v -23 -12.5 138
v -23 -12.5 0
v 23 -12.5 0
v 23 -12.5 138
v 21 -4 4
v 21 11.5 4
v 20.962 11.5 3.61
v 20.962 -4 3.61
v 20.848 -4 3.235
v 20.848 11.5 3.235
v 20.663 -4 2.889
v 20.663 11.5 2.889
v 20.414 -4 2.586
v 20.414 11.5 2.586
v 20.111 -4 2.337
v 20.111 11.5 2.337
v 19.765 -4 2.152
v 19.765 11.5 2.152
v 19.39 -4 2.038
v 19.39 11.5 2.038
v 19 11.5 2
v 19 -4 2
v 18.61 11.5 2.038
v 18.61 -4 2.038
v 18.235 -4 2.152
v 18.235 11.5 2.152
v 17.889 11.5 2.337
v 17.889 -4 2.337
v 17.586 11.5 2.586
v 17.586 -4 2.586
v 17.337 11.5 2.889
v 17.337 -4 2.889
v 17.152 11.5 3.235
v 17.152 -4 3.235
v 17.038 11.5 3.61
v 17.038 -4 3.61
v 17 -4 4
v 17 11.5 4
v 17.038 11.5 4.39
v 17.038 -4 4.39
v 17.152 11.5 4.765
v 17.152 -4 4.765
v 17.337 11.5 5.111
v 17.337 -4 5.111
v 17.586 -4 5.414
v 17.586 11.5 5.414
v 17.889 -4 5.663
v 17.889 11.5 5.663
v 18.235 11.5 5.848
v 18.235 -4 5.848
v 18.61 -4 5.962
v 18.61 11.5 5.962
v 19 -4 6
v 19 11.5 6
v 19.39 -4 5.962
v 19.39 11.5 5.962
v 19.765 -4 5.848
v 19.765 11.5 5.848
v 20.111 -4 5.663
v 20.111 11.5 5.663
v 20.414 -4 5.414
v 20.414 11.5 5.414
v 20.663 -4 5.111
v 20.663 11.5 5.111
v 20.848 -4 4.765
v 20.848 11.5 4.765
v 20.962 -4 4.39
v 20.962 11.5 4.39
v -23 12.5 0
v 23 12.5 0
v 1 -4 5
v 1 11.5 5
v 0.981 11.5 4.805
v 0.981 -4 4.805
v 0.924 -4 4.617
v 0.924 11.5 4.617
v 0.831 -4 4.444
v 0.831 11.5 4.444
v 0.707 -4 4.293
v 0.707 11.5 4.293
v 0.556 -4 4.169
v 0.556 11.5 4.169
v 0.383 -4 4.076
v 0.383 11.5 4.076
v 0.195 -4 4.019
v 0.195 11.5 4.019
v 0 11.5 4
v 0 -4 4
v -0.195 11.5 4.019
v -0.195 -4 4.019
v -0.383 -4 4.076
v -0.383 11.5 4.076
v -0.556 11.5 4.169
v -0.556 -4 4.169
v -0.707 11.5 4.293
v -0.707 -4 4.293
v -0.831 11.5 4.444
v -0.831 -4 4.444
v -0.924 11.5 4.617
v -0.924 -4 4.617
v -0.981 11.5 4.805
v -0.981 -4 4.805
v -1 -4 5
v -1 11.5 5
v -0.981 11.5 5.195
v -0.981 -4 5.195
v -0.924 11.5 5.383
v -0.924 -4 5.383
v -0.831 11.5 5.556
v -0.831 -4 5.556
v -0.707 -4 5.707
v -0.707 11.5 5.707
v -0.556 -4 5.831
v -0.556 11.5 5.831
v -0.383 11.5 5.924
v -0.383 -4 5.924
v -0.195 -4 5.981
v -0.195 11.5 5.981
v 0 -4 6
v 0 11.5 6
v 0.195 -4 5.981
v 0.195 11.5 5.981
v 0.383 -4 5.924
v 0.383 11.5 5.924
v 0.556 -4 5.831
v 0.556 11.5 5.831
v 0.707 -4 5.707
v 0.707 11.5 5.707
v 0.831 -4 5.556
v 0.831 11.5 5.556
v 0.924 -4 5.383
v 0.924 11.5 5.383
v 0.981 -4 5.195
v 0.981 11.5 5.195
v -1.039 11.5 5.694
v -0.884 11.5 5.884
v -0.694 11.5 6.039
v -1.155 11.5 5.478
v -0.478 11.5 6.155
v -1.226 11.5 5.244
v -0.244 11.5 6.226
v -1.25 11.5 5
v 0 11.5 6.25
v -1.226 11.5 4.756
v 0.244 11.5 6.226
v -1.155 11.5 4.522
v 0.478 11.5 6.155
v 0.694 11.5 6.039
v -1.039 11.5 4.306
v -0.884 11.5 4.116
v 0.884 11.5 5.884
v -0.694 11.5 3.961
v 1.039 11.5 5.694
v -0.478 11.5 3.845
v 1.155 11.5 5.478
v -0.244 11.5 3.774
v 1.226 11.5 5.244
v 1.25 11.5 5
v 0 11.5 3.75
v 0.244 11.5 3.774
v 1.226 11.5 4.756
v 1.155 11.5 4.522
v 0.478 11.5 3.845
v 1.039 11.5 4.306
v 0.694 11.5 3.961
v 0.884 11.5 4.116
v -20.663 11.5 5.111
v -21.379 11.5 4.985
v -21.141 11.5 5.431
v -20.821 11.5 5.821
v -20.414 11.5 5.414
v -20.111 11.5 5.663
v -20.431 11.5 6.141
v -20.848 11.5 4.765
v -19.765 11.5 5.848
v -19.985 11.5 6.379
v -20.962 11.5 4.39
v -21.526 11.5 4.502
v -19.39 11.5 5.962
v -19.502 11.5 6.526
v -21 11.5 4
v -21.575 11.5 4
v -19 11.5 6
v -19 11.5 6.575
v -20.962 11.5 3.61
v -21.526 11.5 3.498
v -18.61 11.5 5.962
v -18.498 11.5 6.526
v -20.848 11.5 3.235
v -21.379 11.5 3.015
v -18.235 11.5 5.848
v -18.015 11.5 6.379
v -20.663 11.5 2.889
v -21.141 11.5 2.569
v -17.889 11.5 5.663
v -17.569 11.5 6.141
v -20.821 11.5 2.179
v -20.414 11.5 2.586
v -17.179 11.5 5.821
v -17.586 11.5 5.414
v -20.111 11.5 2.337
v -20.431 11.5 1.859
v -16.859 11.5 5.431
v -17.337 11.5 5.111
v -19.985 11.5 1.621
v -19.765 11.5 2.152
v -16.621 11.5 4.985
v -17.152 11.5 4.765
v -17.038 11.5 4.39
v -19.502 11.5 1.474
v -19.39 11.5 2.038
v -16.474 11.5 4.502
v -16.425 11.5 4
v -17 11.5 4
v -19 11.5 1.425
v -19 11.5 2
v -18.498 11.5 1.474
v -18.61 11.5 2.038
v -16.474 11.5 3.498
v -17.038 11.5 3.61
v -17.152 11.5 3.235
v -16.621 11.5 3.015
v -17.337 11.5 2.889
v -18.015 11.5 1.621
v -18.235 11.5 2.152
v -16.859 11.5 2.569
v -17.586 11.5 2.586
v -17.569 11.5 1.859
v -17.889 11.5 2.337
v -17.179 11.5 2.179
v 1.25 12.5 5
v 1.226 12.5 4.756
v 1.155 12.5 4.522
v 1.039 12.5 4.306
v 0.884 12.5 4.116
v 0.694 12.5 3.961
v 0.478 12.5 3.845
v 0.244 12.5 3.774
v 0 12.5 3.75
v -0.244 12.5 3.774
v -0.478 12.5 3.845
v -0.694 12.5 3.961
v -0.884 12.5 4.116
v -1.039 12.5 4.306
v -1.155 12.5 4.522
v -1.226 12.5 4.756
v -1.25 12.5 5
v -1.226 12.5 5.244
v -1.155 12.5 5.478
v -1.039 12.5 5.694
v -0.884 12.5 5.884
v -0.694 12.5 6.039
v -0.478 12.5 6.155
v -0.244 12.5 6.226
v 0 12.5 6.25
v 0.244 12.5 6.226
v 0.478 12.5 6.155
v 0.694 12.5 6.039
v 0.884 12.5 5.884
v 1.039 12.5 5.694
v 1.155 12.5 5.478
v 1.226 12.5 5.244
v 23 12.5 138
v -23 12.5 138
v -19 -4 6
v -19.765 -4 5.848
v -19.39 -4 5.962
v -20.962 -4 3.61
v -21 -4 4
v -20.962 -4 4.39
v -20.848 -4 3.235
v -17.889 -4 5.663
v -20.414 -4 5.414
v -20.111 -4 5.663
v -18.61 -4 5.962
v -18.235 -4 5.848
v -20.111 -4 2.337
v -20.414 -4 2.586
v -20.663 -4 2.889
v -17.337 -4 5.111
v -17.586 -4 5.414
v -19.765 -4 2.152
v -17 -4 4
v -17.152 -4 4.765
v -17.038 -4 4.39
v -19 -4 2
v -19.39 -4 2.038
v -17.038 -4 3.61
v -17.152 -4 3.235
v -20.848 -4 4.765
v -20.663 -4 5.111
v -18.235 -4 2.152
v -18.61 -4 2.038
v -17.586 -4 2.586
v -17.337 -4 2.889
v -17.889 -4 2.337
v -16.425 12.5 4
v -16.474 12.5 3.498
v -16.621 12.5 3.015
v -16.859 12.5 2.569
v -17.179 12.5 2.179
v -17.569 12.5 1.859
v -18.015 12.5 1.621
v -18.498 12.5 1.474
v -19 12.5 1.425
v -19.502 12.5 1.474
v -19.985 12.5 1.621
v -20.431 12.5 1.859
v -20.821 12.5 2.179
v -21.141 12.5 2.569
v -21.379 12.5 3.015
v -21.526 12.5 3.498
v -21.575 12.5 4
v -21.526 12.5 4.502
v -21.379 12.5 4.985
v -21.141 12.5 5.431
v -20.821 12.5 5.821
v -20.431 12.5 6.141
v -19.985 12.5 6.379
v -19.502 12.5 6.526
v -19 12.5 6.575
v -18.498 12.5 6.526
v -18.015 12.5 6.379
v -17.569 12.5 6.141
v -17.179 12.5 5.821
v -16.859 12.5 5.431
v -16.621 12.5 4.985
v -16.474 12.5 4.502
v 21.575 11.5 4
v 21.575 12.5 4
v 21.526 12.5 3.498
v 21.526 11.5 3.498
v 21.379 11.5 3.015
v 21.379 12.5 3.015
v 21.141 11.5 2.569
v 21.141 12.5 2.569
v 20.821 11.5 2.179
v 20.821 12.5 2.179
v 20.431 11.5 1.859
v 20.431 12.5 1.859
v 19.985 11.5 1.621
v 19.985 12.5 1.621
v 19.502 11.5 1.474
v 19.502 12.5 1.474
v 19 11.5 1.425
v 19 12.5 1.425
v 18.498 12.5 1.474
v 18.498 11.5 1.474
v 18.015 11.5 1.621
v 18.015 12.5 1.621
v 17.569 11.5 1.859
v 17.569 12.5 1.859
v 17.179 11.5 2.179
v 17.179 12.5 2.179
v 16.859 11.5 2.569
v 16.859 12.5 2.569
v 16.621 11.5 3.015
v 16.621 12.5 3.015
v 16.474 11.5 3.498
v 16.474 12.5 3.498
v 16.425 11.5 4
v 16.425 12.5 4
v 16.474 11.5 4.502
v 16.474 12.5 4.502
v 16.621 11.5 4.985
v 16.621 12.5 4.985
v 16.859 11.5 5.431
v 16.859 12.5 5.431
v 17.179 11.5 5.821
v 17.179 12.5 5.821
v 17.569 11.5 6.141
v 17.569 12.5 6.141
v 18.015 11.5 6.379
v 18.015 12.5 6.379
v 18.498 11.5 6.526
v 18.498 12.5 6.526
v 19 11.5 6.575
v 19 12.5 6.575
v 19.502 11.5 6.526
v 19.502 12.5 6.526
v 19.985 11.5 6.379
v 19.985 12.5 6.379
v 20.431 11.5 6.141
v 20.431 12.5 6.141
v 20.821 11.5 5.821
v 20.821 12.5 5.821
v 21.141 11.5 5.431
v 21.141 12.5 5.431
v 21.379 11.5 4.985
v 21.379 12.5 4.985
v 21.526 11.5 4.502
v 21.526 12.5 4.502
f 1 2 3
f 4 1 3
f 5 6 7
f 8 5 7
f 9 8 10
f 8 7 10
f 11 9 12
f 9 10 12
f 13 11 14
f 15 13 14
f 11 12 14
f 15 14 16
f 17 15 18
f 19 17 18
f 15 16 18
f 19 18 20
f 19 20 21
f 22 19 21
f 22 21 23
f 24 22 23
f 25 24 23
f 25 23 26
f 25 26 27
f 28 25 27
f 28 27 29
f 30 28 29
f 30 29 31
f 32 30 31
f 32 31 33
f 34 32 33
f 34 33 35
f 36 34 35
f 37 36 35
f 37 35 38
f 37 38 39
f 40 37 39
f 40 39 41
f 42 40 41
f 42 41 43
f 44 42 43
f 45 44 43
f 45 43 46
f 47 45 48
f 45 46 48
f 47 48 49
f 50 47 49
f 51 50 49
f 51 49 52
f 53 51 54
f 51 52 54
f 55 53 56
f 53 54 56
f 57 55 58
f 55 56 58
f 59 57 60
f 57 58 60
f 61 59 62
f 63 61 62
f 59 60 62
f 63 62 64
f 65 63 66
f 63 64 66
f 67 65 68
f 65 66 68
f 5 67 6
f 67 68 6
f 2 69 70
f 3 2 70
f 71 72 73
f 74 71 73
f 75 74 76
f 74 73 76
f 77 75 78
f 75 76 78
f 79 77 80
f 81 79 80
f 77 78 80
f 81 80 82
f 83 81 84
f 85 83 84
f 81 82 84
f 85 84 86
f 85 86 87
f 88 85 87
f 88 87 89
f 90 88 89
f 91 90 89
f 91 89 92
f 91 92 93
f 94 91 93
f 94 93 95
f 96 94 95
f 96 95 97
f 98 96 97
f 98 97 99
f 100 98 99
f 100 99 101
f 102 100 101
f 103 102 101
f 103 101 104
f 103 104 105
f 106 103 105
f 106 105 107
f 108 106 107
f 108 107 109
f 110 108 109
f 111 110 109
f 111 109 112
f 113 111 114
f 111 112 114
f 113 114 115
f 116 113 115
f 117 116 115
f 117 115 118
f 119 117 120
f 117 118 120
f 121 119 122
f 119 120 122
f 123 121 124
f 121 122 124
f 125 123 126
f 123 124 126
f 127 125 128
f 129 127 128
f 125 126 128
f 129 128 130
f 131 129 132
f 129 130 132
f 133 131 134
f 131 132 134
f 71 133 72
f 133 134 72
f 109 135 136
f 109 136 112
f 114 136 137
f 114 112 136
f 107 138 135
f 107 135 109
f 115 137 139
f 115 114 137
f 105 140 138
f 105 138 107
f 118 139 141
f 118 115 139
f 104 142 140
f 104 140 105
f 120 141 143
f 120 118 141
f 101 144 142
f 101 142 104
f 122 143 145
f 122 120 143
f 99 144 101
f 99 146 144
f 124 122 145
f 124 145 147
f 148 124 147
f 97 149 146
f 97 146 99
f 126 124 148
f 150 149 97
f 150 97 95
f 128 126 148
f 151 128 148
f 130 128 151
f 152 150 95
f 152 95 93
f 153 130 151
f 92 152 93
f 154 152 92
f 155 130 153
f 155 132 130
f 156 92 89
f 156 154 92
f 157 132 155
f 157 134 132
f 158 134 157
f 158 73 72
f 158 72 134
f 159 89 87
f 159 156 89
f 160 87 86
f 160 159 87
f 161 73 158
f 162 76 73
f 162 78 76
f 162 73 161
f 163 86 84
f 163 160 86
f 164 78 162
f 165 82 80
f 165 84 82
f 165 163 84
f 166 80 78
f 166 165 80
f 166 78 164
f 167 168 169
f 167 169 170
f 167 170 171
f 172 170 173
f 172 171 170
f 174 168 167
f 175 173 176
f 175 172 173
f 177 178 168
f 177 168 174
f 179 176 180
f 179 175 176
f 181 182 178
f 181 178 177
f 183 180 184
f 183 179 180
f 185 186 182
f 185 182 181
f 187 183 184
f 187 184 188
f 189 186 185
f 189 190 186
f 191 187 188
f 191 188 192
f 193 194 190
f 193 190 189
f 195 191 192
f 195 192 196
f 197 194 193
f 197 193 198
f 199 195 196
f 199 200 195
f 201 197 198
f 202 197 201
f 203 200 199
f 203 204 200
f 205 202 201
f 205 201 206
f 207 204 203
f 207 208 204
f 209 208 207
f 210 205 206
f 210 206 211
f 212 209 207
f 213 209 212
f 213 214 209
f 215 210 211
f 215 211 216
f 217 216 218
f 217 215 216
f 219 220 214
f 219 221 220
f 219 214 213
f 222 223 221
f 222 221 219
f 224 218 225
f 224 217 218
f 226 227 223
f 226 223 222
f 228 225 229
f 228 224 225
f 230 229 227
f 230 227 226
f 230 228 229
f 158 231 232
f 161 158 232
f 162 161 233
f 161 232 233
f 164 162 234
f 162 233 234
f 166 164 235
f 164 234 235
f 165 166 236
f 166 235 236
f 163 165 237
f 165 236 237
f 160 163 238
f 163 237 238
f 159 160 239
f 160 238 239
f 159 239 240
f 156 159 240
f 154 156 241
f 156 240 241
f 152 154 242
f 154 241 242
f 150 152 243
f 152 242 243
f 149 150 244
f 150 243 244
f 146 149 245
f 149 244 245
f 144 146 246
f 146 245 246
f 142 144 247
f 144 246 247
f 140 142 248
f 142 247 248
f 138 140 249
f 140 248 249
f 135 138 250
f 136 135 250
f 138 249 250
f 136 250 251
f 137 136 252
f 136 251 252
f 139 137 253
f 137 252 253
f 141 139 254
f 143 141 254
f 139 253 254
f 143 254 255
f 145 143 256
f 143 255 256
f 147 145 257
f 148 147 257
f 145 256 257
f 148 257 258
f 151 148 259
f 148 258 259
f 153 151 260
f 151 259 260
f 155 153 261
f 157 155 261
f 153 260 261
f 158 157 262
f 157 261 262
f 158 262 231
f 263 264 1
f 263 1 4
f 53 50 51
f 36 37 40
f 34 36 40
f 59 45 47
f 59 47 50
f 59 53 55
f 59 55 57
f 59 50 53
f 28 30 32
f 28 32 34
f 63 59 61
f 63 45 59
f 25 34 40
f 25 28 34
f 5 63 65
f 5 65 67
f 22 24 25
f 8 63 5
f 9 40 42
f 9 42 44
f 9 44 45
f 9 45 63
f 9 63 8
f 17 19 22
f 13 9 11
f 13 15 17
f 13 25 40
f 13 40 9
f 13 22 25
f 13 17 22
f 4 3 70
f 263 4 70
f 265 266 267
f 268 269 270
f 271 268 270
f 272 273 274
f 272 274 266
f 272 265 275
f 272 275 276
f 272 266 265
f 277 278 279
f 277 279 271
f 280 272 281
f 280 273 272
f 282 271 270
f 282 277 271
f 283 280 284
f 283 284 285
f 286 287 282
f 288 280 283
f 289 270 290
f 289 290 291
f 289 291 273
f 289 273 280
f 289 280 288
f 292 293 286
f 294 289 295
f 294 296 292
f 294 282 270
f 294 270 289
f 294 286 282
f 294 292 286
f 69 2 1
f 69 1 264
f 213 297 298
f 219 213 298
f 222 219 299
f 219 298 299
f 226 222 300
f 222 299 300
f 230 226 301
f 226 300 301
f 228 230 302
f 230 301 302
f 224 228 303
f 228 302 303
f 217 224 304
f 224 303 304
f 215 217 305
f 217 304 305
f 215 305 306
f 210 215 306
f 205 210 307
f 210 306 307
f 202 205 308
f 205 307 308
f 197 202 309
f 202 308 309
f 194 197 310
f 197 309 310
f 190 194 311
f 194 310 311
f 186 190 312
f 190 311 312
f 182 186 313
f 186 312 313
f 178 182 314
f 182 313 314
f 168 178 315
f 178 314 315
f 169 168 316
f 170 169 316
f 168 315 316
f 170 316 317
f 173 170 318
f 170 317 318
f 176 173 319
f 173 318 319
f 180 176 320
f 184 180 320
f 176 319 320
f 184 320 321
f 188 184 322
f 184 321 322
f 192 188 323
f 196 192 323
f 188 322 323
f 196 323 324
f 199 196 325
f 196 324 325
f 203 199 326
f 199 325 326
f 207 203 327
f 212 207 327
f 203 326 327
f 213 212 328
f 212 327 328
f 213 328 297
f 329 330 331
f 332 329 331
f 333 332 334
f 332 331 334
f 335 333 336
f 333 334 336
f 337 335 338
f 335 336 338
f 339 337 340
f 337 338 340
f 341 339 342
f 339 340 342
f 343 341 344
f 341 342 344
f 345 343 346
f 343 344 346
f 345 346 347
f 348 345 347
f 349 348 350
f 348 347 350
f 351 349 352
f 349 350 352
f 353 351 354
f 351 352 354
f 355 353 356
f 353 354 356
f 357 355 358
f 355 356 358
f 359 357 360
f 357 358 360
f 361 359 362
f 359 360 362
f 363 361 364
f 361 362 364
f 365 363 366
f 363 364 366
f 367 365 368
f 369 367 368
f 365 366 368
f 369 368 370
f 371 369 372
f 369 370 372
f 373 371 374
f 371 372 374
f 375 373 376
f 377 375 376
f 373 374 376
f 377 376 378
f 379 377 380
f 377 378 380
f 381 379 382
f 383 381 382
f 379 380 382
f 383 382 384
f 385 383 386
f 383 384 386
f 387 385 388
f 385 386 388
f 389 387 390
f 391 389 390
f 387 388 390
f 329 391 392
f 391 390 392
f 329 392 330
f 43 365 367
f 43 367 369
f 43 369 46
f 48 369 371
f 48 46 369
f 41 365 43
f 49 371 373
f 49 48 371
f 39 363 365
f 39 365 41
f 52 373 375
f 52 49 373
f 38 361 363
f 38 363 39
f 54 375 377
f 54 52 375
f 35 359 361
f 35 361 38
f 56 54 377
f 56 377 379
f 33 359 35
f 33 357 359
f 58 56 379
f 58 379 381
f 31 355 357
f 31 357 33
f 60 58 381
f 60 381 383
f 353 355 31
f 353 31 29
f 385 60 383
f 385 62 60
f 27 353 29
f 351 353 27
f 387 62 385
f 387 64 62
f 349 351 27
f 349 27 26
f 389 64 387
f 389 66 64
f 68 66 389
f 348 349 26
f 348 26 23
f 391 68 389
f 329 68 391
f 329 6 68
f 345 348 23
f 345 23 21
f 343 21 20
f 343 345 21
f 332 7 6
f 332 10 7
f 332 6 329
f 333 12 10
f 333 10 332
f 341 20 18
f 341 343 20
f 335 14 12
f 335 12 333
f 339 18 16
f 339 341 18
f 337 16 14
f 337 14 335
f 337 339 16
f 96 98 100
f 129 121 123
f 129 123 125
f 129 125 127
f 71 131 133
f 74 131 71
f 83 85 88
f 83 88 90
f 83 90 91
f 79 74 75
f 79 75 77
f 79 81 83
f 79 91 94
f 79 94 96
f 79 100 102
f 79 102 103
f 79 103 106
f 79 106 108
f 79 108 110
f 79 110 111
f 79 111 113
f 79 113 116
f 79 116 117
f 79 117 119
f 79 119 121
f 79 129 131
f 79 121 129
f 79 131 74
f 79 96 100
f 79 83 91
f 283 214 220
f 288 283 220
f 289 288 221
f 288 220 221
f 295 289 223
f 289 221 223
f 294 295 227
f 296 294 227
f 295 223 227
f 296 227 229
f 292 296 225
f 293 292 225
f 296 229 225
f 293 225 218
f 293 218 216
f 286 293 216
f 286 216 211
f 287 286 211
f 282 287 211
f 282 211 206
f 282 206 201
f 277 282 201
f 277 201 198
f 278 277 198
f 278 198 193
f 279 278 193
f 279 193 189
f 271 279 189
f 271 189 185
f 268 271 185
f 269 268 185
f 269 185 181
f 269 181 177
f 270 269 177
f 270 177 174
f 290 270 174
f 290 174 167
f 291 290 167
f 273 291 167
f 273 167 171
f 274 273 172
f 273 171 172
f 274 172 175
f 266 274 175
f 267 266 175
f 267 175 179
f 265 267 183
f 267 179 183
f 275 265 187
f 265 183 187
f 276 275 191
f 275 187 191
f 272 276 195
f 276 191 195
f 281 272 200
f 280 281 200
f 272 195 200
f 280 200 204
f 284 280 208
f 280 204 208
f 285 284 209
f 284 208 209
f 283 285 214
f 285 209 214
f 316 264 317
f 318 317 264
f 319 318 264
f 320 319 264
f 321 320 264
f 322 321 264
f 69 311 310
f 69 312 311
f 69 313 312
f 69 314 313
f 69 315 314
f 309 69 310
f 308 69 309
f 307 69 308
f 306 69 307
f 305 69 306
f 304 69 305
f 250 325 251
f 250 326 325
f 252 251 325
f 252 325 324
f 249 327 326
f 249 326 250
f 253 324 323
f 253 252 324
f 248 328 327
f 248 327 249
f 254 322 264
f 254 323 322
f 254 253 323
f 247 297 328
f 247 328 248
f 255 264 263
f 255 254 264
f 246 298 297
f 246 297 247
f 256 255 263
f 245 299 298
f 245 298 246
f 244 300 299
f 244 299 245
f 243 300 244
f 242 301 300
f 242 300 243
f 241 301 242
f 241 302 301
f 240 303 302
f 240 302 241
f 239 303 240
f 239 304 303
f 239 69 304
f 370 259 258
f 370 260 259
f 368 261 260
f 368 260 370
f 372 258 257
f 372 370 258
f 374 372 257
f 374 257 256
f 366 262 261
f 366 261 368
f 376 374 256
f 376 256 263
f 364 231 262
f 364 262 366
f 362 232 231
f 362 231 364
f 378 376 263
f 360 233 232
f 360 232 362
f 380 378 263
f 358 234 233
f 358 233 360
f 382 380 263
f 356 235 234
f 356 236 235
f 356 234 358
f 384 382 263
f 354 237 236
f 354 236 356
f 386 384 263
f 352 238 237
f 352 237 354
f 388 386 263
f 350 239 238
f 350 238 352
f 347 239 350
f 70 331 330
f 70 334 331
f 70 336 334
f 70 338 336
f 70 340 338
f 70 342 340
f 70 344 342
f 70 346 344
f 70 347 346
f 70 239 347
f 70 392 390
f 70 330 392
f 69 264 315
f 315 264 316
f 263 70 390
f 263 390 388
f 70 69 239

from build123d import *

# Parameters (mm, degrees)
SKETCH2_W           = 46
SKETCH2_H           = 25
BOSS_EXTRUDE1_DEPTH = 138
SKETCH3_R           = 2.575
SKETCH3_R_2         = 1.25
CUT_EXTRUDE1_DEPTH  = 1
SKETCH4_R           = 2
SKETCH4_R_2         = 1
CUT_EXTRUDE2_DEPTH  = 16.5


with BuildPart() as part:
    # Sketch2 → Boss-Extrude1 (new body)
    with BuildSketch(Plane.XY):
        Rectangle(SKETCH2_W, SKETCH2_H)
    extrude(amount=BOSS_EXTRUDE1_DEPTH)

    # Sketch3 → Cut-Extrude1 (cut)
    with BuildSketch(Plane(origin=(0, 12.5, 0), x_dir=(1, 0, 0), z_dir=(0, 1, 0))):
        with Locations((-19, -4)):
            Circle(SKETCH3_R)
        with Locations((0, -5)):
            Circle(SKETCH3_R_2)
        with Locations((19, -4)):
            Circle(SKETCH3_R)
    extrude(amount=-CUT_EXTRUDE1_DEPTH, mode=Mode.SUBTRACT)

    # Sketch4 → Cut-Extrude2 (cut)
    with BuildSketch(Plane(origin=(0, 12.5, 0), x_dir=(1, 0, 0), z_dir=(0, 1, 0))):
        with Locations((-19, -4)):
            Circle(SKETCH4_R)
        with Locations((19, -4)):
            Circle(SKETCH4_R)
        with Locations((0, -5)):
            Circle(SKETCH4_R_2)
    extrude(amount=-CUT_EXTRUDE2_DEPTH, mode=Mode.SUBTRACT)


solid = part.part
